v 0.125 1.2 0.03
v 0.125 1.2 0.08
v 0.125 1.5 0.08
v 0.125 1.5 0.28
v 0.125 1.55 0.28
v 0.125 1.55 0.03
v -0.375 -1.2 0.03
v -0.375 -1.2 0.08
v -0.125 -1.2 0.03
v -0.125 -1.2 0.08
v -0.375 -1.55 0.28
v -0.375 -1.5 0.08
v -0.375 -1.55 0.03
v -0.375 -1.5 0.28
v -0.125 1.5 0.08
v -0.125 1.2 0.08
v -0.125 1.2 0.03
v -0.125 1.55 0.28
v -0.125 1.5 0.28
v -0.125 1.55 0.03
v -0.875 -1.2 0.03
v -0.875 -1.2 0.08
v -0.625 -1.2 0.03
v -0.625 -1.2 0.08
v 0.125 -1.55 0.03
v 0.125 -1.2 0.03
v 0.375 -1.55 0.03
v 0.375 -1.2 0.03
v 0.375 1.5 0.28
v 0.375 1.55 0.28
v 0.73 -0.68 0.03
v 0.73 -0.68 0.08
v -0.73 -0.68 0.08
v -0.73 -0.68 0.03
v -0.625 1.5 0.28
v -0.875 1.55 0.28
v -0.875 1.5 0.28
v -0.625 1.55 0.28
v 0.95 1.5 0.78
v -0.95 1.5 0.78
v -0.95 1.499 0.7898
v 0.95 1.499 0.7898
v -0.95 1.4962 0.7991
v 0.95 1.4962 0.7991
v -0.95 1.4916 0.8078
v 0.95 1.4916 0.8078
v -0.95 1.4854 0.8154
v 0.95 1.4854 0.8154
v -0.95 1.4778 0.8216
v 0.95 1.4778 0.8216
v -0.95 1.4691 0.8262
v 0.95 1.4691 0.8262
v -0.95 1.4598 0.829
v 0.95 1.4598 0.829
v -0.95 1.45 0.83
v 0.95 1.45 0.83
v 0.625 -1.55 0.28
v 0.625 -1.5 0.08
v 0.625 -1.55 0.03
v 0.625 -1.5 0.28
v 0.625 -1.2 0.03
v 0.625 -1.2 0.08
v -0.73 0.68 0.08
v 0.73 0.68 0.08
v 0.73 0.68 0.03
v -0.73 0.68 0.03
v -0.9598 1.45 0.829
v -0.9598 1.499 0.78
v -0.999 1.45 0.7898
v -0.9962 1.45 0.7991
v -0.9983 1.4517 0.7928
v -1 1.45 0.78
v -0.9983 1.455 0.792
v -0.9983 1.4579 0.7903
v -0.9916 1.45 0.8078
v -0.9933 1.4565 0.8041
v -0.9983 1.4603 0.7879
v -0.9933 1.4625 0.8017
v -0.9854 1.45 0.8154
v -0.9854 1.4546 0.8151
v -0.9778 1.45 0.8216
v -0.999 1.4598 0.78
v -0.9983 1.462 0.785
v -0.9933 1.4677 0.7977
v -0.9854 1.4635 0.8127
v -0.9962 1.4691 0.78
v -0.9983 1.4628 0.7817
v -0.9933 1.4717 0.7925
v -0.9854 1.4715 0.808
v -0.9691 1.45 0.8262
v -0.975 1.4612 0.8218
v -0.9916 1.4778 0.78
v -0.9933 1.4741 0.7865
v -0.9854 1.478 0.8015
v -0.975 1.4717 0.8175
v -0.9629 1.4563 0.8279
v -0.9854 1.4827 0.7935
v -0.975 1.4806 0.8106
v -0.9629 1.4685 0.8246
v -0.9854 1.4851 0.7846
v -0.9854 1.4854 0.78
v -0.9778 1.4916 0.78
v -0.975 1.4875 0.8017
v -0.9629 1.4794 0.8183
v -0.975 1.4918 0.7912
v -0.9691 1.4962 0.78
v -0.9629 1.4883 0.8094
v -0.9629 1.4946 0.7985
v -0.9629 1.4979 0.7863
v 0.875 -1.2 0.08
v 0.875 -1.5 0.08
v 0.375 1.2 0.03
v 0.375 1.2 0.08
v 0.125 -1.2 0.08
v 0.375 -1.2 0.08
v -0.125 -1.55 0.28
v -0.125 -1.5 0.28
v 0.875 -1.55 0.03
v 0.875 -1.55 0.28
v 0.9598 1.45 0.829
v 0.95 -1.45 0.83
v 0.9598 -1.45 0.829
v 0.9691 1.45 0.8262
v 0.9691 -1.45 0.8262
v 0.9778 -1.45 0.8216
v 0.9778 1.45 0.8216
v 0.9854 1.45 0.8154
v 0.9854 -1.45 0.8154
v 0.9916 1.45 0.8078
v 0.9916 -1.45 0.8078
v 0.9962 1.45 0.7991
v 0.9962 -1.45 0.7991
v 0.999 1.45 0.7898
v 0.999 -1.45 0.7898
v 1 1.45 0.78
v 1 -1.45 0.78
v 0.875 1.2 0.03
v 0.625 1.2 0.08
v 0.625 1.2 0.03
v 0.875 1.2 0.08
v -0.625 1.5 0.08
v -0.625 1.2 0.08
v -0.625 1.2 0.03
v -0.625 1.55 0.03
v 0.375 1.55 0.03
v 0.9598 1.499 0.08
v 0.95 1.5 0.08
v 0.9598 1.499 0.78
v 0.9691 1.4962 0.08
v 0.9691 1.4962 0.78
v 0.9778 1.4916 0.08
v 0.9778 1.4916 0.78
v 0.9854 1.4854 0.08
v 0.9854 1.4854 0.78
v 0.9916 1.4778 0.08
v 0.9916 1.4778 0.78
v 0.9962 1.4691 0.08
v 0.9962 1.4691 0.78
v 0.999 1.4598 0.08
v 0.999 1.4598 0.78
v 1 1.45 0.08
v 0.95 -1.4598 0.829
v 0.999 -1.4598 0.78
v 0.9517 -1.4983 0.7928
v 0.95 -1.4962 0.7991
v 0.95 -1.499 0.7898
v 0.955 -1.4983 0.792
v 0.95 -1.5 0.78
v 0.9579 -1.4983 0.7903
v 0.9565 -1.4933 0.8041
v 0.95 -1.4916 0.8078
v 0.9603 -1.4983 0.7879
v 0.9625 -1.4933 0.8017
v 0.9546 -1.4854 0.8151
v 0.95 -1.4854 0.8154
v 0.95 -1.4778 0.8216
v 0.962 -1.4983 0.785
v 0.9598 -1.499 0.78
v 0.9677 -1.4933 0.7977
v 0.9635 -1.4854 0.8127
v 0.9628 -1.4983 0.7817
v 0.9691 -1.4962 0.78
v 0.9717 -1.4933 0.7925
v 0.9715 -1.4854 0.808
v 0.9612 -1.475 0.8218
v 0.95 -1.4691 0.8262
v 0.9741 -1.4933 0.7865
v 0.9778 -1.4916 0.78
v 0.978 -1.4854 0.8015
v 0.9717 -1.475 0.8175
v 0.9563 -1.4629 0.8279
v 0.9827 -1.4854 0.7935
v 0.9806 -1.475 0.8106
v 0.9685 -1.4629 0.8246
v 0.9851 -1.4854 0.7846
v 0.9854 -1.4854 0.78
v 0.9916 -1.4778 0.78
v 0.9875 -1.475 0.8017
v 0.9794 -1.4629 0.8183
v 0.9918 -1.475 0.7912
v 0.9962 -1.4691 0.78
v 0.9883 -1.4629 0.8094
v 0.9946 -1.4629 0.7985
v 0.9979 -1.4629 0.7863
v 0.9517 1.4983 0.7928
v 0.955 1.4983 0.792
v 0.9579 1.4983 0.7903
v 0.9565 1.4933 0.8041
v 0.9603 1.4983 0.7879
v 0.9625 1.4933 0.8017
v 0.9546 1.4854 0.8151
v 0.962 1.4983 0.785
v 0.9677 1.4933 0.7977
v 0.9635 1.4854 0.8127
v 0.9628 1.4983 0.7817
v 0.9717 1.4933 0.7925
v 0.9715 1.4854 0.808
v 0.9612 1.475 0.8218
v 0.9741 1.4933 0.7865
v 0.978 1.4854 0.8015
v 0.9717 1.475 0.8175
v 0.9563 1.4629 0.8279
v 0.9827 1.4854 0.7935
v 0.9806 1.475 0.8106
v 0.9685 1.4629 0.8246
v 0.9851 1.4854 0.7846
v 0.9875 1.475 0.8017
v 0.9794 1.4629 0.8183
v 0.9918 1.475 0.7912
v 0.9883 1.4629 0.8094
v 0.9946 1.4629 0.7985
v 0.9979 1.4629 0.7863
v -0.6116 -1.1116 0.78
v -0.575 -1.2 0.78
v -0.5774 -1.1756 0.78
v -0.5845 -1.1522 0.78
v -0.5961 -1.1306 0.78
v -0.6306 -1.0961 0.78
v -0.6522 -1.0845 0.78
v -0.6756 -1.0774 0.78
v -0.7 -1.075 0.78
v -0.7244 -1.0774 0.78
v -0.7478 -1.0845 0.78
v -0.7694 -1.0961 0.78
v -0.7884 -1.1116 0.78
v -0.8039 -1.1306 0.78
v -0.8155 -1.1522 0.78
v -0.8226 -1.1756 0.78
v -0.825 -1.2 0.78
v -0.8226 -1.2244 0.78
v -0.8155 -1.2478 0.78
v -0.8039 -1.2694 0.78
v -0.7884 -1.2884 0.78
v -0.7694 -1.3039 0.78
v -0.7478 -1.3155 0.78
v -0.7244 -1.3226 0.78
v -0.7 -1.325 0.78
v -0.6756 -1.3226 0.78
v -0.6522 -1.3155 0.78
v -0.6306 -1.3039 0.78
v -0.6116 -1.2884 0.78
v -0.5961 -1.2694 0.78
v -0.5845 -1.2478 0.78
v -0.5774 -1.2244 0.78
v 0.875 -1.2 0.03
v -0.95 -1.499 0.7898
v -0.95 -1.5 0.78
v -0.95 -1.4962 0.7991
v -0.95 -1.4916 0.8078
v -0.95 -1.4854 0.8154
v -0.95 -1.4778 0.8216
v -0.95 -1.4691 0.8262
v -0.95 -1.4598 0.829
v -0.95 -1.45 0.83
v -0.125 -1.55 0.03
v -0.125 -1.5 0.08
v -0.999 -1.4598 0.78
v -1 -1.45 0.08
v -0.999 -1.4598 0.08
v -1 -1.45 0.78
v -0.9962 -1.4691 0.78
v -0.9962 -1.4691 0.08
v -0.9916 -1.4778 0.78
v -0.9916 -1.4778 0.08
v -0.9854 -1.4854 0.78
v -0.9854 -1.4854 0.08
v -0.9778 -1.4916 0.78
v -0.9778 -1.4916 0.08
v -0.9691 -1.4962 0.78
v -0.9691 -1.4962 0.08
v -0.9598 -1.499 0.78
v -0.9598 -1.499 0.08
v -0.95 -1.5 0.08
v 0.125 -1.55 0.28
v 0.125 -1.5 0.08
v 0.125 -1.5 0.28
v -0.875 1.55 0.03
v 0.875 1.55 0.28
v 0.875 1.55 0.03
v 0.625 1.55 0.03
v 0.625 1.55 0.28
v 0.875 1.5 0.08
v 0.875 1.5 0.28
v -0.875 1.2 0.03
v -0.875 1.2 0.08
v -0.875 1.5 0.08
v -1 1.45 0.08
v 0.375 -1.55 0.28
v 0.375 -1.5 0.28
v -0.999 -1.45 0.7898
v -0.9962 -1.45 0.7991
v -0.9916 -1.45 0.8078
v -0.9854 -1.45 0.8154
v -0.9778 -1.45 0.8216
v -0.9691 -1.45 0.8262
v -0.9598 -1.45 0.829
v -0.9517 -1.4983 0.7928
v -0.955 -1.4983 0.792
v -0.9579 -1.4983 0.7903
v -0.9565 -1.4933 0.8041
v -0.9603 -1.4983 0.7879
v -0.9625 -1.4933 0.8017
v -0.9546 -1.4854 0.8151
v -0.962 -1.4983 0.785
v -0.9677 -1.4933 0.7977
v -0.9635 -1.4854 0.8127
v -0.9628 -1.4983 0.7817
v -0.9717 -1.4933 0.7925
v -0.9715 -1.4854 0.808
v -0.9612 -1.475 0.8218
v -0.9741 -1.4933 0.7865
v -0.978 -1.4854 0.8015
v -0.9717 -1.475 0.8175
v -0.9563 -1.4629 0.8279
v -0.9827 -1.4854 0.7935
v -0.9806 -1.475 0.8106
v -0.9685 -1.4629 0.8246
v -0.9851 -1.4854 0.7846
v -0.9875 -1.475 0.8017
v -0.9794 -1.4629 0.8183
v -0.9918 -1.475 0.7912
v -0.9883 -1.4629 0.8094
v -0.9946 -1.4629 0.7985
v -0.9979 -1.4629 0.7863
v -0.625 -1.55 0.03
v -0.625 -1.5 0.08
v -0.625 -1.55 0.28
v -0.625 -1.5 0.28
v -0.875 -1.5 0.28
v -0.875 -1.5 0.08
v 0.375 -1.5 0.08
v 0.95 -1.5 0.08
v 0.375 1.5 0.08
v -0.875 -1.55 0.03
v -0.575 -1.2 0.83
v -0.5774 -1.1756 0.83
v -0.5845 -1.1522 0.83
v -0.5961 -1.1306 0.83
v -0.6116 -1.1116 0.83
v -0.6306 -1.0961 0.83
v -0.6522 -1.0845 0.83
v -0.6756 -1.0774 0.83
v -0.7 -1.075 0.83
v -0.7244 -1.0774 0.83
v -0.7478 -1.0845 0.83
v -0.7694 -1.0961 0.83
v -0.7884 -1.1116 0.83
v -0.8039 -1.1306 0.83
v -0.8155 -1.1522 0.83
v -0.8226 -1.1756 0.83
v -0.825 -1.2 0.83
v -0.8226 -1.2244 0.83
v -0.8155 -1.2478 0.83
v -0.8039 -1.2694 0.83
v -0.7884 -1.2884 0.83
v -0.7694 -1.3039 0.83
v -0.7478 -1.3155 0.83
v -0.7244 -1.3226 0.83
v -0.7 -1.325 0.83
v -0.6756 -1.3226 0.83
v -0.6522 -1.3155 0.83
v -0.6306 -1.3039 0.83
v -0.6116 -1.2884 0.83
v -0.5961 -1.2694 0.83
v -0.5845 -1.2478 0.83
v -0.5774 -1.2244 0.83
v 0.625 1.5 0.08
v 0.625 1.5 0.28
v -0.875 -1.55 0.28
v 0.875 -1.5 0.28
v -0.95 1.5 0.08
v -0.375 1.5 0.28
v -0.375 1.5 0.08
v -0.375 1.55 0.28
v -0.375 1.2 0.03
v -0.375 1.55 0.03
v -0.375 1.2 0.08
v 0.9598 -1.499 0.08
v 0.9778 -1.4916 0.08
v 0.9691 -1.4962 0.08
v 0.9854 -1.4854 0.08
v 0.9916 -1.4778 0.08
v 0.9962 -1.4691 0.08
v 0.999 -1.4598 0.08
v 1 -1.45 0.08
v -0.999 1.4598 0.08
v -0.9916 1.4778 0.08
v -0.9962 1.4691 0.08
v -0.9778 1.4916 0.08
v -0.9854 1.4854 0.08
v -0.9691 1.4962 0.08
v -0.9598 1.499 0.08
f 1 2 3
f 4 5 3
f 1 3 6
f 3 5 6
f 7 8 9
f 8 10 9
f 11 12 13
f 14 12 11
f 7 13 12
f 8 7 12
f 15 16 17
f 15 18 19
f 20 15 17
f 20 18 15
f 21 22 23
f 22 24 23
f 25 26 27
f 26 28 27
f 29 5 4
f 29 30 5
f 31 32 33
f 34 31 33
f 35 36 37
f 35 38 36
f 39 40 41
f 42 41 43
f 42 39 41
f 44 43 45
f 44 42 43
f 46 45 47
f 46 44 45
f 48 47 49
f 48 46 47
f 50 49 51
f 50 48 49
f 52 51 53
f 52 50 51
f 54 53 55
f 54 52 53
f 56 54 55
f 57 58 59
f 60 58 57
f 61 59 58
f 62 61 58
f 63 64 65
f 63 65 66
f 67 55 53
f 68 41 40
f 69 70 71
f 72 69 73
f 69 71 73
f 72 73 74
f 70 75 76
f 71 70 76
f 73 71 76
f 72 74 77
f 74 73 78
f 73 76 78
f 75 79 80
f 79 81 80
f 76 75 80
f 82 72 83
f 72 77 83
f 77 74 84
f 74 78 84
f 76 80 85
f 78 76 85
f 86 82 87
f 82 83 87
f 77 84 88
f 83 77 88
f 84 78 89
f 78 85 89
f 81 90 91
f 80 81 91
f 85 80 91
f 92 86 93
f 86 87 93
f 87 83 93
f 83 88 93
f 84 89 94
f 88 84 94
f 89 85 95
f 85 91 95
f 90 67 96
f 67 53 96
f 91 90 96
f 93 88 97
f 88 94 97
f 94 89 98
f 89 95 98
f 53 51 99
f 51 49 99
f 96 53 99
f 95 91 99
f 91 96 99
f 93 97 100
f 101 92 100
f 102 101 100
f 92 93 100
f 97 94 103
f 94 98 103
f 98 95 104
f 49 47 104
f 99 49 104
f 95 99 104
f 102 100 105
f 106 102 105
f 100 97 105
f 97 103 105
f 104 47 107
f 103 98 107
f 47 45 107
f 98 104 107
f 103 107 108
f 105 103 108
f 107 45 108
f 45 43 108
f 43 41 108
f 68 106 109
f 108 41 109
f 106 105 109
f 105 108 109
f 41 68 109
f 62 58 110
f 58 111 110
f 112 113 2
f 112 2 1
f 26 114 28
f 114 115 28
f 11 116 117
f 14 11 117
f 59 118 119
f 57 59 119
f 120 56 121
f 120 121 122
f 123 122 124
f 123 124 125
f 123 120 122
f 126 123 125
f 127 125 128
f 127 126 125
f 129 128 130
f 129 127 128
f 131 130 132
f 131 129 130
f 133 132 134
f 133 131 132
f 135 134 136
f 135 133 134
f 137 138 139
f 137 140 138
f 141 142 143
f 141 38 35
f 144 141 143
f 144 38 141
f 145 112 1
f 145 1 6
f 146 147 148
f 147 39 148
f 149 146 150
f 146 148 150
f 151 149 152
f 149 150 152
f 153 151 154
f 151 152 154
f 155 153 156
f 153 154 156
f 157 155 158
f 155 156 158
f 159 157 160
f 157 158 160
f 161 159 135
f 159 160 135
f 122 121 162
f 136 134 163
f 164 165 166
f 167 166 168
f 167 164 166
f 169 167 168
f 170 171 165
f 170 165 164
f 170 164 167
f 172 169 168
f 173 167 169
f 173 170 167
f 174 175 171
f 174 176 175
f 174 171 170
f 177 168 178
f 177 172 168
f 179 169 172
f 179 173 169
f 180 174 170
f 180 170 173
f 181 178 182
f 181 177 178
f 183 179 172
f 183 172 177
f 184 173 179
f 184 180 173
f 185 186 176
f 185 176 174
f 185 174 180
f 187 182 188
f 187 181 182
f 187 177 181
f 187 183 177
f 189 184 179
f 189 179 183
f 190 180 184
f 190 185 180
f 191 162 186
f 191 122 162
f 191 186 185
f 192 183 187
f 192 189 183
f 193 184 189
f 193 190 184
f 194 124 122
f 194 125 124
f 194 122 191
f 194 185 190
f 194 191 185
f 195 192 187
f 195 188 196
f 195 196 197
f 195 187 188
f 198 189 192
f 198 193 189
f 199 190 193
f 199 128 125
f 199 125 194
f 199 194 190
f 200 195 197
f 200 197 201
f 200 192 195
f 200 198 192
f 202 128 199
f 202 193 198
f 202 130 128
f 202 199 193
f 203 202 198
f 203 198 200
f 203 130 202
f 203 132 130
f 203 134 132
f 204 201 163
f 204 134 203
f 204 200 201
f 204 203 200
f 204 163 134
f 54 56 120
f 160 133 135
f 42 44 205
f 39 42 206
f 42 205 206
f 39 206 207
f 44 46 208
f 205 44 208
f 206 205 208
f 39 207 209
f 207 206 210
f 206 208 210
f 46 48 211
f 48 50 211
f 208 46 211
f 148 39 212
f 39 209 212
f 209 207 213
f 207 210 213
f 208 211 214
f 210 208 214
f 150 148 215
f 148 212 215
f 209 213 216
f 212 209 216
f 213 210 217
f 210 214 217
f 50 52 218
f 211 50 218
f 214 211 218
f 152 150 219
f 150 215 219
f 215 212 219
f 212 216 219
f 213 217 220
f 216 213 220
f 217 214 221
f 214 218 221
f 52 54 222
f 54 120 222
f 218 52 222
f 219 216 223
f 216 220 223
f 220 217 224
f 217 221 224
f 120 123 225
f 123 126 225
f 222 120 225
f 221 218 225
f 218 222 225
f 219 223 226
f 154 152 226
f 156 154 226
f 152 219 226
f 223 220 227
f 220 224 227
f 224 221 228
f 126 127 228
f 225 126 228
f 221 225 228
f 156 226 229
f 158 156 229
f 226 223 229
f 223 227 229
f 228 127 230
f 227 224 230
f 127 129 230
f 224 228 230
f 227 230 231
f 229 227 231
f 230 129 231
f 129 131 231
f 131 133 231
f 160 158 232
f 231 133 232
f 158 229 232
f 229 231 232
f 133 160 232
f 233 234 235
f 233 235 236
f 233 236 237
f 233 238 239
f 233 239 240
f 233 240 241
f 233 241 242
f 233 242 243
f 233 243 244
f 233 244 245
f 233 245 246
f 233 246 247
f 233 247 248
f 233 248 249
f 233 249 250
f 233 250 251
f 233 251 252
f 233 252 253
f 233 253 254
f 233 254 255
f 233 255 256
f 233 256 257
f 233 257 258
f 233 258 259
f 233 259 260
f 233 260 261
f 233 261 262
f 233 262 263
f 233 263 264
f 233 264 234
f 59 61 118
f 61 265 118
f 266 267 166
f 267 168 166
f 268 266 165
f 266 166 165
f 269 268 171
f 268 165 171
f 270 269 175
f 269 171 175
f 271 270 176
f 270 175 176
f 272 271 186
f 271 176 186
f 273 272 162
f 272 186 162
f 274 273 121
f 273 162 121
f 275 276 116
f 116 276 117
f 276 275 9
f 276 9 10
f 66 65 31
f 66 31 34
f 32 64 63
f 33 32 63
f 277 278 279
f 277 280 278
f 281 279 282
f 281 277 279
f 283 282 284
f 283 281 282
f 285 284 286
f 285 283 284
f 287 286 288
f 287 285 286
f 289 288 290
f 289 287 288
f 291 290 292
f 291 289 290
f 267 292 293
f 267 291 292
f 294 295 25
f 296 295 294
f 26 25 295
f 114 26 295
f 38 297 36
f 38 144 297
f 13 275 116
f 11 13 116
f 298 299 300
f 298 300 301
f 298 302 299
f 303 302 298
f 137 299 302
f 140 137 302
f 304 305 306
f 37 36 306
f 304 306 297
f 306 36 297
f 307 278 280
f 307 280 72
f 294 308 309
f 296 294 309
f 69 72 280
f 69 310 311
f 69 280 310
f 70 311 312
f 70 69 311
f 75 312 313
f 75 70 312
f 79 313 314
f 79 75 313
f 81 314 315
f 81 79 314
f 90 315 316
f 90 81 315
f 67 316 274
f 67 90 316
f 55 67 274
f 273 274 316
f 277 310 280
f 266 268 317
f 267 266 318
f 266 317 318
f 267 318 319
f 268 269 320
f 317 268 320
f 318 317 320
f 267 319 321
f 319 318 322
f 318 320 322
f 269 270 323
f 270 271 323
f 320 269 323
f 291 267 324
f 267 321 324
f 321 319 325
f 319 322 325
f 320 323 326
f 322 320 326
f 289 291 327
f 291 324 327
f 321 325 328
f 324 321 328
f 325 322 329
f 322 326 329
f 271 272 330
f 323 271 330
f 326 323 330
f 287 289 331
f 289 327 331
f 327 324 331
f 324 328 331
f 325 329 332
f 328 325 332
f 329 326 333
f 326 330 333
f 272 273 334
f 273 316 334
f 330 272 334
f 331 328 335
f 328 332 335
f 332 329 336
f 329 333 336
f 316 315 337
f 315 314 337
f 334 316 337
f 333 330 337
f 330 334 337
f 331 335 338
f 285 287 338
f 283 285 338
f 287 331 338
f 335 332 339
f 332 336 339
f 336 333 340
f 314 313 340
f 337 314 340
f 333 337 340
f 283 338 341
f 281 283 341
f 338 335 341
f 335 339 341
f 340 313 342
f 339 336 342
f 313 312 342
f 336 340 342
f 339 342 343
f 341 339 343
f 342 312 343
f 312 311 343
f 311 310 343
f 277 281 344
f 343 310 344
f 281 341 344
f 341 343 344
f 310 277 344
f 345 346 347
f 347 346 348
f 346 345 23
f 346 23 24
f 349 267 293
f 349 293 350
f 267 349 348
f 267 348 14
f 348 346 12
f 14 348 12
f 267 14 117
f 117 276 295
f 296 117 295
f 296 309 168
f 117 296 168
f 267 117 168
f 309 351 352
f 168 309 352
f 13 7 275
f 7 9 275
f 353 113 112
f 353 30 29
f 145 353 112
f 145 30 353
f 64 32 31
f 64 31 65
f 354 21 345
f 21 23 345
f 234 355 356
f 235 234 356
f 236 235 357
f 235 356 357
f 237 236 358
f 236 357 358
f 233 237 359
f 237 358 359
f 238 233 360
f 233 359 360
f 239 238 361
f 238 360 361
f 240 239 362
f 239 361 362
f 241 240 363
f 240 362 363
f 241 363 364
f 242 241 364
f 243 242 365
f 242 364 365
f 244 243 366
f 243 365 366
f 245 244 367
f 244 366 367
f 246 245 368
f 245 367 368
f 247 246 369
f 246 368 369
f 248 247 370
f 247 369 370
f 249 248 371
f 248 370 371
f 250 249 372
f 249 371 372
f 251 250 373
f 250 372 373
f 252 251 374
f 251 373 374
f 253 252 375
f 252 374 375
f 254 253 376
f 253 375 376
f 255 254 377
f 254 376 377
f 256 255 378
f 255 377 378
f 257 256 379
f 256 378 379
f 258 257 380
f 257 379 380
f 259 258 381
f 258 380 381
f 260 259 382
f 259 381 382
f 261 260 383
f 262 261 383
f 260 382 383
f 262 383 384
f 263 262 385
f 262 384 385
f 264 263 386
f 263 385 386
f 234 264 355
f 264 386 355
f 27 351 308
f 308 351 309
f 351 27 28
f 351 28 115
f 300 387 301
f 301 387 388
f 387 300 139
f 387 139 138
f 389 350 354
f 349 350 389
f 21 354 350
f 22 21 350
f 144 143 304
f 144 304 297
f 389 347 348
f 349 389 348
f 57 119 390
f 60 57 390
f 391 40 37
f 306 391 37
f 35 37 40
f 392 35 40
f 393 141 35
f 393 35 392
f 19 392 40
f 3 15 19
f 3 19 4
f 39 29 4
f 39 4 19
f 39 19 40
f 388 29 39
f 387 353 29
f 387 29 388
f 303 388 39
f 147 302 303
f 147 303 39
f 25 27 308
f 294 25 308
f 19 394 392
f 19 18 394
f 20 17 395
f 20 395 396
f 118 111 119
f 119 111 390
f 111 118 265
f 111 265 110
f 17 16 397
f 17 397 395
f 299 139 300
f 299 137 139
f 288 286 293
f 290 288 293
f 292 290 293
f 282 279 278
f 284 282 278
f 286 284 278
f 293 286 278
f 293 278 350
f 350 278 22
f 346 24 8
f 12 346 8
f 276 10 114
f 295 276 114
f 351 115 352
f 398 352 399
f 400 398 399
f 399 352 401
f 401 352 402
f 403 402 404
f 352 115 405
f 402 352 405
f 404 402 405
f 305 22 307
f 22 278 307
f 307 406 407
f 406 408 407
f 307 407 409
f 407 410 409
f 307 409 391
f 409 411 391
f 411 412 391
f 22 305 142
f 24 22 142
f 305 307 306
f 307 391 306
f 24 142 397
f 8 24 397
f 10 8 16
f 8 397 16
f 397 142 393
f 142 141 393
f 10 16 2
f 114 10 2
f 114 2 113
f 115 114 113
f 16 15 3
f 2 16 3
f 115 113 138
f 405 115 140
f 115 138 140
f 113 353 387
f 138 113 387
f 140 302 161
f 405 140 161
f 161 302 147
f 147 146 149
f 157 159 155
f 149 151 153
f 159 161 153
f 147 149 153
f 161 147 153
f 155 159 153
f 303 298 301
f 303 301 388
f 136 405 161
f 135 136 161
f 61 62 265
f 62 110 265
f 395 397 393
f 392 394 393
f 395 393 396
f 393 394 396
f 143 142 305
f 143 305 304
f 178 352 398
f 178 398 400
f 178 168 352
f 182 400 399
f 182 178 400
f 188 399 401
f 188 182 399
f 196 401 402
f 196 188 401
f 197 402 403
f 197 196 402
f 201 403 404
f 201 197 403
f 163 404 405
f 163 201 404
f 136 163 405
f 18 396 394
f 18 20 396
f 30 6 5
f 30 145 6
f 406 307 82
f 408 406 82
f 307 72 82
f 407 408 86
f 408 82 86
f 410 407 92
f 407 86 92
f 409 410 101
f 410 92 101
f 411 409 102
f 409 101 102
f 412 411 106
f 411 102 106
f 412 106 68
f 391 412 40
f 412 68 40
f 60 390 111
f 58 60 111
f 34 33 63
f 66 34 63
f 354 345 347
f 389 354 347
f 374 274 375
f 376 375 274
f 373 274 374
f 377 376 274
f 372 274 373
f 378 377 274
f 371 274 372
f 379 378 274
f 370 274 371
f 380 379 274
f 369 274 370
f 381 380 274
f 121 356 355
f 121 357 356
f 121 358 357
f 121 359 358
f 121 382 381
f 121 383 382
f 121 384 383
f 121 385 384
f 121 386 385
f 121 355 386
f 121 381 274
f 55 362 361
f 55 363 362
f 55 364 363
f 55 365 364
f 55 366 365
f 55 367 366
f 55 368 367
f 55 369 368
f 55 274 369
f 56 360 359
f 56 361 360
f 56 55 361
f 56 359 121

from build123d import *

# Parameters (mm, degrees)
SKETCH1_W            = 2
SKETCH1_H            = 3
EXTRUDE1_DEPTH       = 0.75
SKETCH2_R            = 0.125
EXTRUDE2_DEPTH       = 0.05
FILLET1_R            = 0.05
EXTRUDE_THIN1_DEPTH  = 0.125
SKETCH5_W            = 1.46
SKETCH5_H            = 1.36
EXTRUDE4_DEPTH       = 0.05
LPATTERN2_COUNT      = 4
LPATTERN2_PITCH      = 0.5
MIRROR1_COPY_1_DEPTH = 0.125
MIRROR1_COPY_2_DEPTH = 0.125
MIRROR1_COPY_3_DEPTH = 0.125


with BuildPart() as part:
    # Sketch1 → Extrude1 (new body)
    with BuildSketch(Plane.XY.offset(0.08)):
        Rectangle(SKETCH1_W, SKETCH1_H)
    extrude(amount=EXTRUDE1_DEPTH)

    # Sketch2 → Extrude2 (cut)
    with BuildSketch(Plane.XY.offset(0.83)):
        with Locations((-0.7, -1.2)):
            Circle(SKETCH2_R)
    extrude(amount=-EXTRUDE2_DEPTH, mode=Mode.SUBTRACT)

    # Fillet1
    fillet1_edges = [part.edges().sort_by_distance(p)[0] for p in [
        (1, 0, 0.83),
        (0, 1.5, 0.83),
        (-1, 0, 0.83),
        (0, -1.5, 0.83),
        (-1, 1.5, 0.455),
        (1, 1.5, 0.455),
        (1, -1.5, 0.455),
        (-1, -1.5, 0.455),
    ]]
    fillet(fillet1_edges, radius=FILLET1_R)


with BuildPart() as body_2:
    # Sketch4 → Extrude-Thin1 (new, symmetric)
    with BuildSketch(Plane(origin=(0.75, 0, 0), x_dir=(0, 0, -1), z_dir=(1, 0, 0))):
        Polygon((-0.28, -1.5), (-0.08, -1.5), (-0.08, -1.2), (-0.03, -1.2), (-0.03, -1.55), (-0.28, -1.55), align=None)
    extrude_thin1 = extrude(amount=EXTRUDE_THIN1_DEPTH, both=True)


with BuildPart() as body_3:
    # Sketch5 → Extrude4 (new body)
    with BuildSketch(Plane(origin=(0, 0, 0.08), x_dir=(-1, 0, 0), z_dir=(0, 0, -1))):
        Rectangle(SKETCH5_W, SKETCH5_H)
    extrude(amount=EXTRUDE4_DEPTH)


with BuildPart() as part_1:
    add(part.part)

    # LPattern2: Extrude-Thin1 ×4
    with Locations(*[(-i * LPATTERN2_PITCH, 0, 0) for i in range(1, LPATTERN2_COUNT)]):
        add(extrude_thin1)

    # Mirror1: Extrude-Thin1 across plane
    add(extrude_thin1.mirror(Plane.ZX))

    # Mirror1 copy 1 sketch → Mirror1 copy 1 (add, symmetric)
    with BuildSketch(Plane(origin=(0.25, 0, 0), x_dir=(0, 0, -1), z_dir=(1, 0, 0))):
        Polygon((-0.28, 1.5), (-0.08, 1.5), (-0.08, 1.2), (-0.03, 1.2), (-0.03, 1.55), (-0.28, 1.55), align=None)
    extrude(amount=MIRROR1_COPY_1_DEPTH, both=True)

    # Mirror1 copy 2 sketch → Mirror1 copy 2 (add, symmetric)
    with BuildSketch(Plane(origin=(-0.25, 0, 0), x_dir=(0, 0, -1), z_dir=(1, 0, 0))):
        Polygon((-0.28, 1.5), (-0.08, 1.5), (-0.08, 1.2), (-0.03, 1.2), (-0.03, 1.55), (-0.28, 1.55), align=None)
    extrude(amount=MIRROR1_COPY_2_DEPTH, both=True)

    # Mirror1 copy 3 sketch → Mirror1 copy 3 (add, symmetric)
    with BuildSketch(Plane(origin=(-0.75, 0, 0), x_dir=(0, 0, -1), z_dir=(1, 0, 0))):
        Polygon((-0.28, 1.5), (-0.08, 1.5), (-0.08, 1.2), (-0.03, 1.2), (-0.03, 1.55), (-0.28, 1.55), align=None)
    extrude(amount=MIRROR1_COPY_3_DEPTH, both=True)


solid = Compound([body_2.part, body_3.part, part_1.part])
